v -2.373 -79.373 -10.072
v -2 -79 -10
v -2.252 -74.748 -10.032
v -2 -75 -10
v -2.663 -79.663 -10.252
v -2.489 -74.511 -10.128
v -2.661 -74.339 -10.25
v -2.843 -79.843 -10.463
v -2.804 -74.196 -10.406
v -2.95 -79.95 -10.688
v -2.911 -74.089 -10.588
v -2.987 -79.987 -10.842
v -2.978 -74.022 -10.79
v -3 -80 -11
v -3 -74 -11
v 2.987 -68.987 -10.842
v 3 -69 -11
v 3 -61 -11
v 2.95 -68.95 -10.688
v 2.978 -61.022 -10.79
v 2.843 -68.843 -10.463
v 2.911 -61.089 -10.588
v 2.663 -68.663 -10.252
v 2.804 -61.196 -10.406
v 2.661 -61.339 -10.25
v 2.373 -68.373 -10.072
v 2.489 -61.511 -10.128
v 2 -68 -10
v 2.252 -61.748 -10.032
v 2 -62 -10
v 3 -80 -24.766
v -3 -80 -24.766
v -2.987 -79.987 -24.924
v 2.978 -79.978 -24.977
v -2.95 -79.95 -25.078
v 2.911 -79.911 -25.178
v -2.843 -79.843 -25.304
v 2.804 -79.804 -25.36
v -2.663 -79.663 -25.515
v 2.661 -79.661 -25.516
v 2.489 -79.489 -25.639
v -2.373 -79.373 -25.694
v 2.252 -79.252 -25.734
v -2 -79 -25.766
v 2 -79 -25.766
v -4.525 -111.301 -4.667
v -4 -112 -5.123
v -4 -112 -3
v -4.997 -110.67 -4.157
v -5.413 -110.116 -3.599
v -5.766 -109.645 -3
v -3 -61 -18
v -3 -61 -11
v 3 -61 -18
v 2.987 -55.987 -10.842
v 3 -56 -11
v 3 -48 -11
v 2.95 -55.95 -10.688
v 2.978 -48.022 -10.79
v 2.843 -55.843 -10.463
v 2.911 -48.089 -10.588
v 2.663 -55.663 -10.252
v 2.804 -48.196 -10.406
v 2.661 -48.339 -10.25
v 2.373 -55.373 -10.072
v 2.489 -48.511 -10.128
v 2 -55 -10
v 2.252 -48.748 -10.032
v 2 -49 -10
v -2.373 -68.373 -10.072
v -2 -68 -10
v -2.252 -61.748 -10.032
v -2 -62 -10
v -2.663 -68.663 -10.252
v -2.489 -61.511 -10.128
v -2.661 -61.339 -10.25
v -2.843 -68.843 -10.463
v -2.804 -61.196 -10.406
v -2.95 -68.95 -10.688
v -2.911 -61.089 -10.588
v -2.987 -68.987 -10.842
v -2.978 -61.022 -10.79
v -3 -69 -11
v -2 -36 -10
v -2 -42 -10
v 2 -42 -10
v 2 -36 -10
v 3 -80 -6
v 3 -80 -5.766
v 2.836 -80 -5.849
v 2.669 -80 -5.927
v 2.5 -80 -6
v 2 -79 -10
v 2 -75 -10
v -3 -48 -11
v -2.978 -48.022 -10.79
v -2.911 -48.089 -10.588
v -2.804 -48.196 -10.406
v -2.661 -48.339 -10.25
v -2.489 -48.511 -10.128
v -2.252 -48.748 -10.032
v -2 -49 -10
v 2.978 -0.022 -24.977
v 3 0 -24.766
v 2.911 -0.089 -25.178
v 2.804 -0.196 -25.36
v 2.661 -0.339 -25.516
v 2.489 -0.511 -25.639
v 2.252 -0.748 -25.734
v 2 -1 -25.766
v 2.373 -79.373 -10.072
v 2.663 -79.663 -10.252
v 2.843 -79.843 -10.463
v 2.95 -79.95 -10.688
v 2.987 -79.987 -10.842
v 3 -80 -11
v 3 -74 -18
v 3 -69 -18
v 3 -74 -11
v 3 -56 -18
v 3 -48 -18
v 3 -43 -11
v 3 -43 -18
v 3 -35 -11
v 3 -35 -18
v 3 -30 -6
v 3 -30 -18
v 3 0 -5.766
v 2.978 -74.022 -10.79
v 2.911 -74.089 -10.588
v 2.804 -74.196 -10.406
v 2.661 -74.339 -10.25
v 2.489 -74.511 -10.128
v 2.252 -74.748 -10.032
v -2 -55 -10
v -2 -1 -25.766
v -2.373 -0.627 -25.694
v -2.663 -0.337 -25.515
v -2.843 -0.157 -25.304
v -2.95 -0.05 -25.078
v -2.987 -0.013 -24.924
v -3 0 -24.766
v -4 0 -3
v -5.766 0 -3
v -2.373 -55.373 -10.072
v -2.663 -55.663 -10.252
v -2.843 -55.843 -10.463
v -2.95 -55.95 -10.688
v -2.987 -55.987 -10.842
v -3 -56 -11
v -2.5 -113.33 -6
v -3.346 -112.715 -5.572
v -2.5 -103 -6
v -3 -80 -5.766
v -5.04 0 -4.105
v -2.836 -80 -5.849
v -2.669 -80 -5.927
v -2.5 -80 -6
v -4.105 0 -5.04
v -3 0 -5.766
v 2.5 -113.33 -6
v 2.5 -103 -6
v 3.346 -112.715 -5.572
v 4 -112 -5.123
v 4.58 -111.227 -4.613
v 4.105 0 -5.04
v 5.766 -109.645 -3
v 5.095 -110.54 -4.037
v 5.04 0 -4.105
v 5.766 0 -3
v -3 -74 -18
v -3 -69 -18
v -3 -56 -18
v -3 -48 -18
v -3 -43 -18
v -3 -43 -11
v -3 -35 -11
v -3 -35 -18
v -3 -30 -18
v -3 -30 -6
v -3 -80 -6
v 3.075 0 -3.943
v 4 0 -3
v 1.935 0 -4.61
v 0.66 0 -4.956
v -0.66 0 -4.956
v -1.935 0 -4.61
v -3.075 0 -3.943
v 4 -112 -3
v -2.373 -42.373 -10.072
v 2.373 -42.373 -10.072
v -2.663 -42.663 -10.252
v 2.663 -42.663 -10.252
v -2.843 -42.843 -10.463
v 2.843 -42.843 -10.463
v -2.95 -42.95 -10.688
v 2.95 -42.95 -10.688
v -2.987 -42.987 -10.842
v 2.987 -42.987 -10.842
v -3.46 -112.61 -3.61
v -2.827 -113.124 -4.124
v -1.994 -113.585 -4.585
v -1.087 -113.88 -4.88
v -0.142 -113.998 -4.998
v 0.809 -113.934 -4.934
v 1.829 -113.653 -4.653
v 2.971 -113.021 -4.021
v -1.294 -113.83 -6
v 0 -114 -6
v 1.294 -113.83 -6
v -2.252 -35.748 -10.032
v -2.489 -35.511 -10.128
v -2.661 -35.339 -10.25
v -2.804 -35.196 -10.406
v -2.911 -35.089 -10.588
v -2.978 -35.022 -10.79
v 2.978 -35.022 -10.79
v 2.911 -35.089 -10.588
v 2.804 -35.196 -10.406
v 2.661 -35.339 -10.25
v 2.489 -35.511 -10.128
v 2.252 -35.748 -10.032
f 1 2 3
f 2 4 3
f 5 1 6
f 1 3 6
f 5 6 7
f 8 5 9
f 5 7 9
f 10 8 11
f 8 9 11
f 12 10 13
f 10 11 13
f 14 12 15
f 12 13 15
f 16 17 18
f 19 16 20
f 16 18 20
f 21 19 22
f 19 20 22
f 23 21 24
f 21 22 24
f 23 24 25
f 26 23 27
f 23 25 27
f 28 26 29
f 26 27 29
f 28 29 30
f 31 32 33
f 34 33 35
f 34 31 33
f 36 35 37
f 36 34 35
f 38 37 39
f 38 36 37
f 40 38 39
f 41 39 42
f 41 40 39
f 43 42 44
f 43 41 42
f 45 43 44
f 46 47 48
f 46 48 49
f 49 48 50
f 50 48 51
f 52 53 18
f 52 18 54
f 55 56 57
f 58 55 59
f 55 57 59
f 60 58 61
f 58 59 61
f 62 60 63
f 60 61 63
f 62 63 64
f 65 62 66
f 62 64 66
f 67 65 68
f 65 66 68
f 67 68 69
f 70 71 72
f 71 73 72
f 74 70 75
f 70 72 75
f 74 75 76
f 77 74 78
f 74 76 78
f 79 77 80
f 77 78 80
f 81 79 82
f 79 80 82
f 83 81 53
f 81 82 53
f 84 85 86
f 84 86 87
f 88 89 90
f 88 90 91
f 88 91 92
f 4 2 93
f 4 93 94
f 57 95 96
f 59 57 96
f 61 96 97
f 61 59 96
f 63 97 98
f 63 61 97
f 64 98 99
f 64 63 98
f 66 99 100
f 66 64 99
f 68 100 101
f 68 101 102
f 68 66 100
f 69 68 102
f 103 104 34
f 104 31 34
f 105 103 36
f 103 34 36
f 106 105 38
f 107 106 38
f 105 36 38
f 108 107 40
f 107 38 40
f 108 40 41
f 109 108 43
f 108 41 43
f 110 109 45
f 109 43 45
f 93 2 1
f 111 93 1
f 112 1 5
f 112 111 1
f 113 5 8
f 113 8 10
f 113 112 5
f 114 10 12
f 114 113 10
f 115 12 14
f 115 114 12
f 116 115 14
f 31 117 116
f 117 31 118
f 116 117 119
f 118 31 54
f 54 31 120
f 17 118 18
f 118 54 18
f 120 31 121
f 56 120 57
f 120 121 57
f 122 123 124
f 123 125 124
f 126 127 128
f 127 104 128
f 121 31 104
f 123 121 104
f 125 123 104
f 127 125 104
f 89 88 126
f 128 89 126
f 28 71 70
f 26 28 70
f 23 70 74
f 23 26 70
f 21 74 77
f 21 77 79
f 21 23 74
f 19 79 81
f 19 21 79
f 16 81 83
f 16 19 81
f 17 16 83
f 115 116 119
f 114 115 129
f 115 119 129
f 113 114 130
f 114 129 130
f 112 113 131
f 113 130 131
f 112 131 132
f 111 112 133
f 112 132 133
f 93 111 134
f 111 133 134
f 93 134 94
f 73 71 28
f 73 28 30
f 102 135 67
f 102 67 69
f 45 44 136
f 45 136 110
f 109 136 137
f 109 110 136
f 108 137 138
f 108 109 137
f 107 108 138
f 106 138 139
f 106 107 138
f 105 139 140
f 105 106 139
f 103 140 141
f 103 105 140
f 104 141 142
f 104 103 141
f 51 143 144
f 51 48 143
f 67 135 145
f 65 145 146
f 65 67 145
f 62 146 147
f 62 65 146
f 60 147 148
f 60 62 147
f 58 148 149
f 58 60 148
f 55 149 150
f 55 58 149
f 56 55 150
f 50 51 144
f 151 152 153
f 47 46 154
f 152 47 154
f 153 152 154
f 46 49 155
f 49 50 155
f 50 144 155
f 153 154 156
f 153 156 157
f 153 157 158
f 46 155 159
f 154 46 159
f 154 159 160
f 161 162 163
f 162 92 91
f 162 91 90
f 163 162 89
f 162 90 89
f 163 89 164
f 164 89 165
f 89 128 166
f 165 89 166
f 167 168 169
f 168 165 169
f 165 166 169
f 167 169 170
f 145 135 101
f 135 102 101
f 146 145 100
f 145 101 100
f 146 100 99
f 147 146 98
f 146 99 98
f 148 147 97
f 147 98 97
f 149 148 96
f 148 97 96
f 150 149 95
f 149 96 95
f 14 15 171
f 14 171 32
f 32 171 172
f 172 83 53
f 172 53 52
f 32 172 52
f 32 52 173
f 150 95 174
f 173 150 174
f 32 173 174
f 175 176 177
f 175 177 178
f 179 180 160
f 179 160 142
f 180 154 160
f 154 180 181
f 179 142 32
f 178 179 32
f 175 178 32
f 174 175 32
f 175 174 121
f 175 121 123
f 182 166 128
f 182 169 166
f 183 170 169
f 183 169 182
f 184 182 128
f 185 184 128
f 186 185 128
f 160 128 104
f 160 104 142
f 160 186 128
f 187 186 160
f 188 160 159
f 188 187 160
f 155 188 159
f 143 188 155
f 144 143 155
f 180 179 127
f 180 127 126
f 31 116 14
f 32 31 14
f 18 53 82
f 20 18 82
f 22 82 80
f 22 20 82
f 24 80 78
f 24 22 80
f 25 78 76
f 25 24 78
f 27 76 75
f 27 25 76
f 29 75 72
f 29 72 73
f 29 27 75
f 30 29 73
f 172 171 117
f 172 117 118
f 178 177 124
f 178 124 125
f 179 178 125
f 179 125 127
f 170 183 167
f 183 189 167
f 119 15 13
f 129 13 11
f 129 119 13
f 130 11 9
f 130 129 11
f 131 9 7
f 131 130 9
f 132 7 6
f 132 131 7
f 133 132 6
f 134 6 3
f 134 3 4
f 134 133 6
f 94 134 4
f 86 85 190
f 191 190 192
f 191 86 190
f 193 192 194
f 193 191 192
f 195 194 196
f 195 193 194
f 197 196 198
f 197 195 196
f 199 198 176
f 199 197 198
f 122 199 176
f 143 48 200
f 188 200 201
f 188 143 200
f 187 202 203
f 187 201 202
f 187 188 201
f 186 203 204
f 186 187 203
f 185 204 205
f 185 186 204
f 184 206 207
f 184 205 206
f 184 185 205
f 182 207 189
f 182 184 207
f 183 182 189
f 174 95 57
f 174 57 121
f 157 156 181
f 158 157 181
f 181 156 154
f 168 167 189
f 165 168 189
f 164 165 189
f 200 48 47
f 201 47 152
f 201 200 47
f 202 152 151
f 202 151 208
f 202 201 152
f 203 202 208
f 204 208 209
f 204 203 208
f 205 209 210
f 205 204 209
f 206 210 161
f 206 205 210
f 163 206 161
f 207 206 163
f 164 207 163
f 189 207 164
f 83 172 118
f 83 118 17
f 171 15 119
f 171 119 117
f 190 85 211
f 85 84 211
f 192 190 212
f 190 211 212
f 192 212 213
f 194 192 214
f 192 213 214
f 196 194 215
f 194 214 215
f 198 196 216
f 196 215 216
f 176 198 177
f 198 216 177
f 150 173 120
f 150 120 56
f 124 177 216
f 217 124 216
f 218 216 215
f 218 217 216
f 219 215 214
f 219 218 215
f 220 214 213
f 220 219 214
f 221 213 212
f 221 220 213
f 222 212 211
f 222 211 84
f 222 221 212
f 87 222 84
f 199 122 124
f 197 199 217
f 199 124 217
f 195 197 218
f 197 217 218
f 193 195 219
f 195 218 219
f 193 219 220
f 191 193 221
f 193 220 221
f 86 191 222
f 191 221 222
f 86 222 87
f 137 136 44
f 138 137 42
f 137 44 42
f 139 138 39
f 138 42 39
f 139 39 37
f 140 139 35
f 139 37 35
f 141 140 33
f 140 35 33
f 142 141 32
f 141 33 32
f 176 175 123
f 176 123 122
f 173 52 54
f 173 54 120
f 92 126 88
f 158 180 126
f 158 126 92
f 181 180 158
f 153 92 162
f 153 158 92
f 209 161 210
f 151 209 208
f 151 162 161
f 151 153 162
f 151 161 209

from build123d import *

# Parameters (mm, degrees)
PAD_DEPTH            = 120
PAD001_DEPTH         = 80
POCKET_DEPTH         = 5.767281
POCKET_DEPTH_BACK    = 5.767281
POCKET001_DEPTH      = 25.767281
POCKET002_DEPTH      = 5.767281
POCKET002_DEPTH_BACK = 5.767281
POCKET003_DEPTH      = 5.767281
POCKET003_DEPTH_BACK = 5.767281
POCKET004_DEPTH      = 5.767281
POCKET004_DEPTH_BACK = 5.767281
FILLET_R             = 1


with BuildPart() as part:
    # Sketch → Pad (new body)
    with BuildSketch(Plane.XZ):
        with BuildLine():
            ThreePointArc((-4, -3), (0, -5), (4, -3))
            Line((4, -3), (5.766281, -3))
            ThreePointArc((-5.766281, -3), (0, -6.5), (5.766281, -3))
            Line((-4, -3), (-5.766281, -3))
        make_face()
    extrude(amount=PAD_DEPTH)

    # Sketch001 → Pad001 (join)
    with BuildSketch(Plane.XZ):
        with BuildLine():
            ThreePointArc((-3, -5.766281), (0, -6.5), (3, -5.766281))
            Line((3, -25.766281), (3, -5.766281))
            Line((-3, -25.766281), (3, -25.766281))
            Line((-3, -5.766281), (-3, -25.766281))
        make_face()
    extrude(amount=PAD001_DEPTH)

    # Sketch002 → Pocket (cut, two sides)
    with BuildSketch(Plane.YZ) as pocket_sk:
        Polygon((-30, -18), (-30, -6), (-90, -6), (-90, -10), (-35, -10), (-35, -18), align=None)
    extrude(amount=-POCKET_DEPTH, mode=Mode.SUBTRACT)
    extrude(pocket_sk.sketch, amount=POCKET_DEPTH_BACK, mode=Mode.SUBTRACT)

    # Sketch003 → Pocket001 (cut, through all)
    with BuildSketch(Plane.XY):
        with BuildLine():
            Line((-10, -104), (-10, -134))
            Line((-10, -134), (10, -134))
            Line((10, -134), (10, -104))
            Line((10, -104), (4, -112))
            ThreePointArc((-4, -112), (0, -114), (4, -112))
            Line((-4, -112), (-10, -104))
        make_face()
    extrude(amount=-POCKET001_DEPTH, mode=Mode.SUBTRACT)

    # Sketch004 → Pocket002 (cut, two sides)
    with BuildSketch(Plane.YZ) as pocket002_sk:
        Polygon((-43, -18), (-43, -6), (-103, -6), (-103, -10), (-48, -10), (-48, -18), align=None)
    extrude(amount=-POCKET002_DEPTH, mode=Mode.SUBTRACT)
    extrude(pocket002_sk.sketch, amount=POCKET002_DEPTH_BACK, mode=Mode.SUBTRACT)

    # Sketch005 → Pocket003 (cut, two sides)
    with BuildSketch(Plane.YZ) as pocket003_sk:
        Polygon((-56, -18), (-56, -6), (-116, -6), (-116, -10), (-61, -10), (-61, -18), align=None)
    extrude(amount=-POCKET003_DEPTH, mode=Mode.SUBTRACT)
    extrude(pocket003_sk.sketch, amount=POCKET003_DEPTH_BACK, mode=Mode.SUBTRACT)

    # Sketch006 → Pocket004 (cut, two sides)
    with BuildSketch(Plane.YZ) as pocket004_sk:
        Polygon((-69, -18), (-69, -6), (-129, -6), (-129, -10), (-74, -10), (-74, -18), align=None)
    extrude(amount=-POCKET004_DEPTH, mode=Mode.SUBTRACT)
    extrude(pocket004_sk.sketch, amount=POCKET004_DEPTH_BACK, mode=Mode.SUBTRACT)

    # Fillet
    fillet_edges = [part.edges().sort_by_distance(p)[0] for p in [
        (0, -74, -10),
        (-3, -77, -10),
        (0, -80, -10),
        (3, -77, -10),
        (0, -61, -10),
        (-3, -65, -10),
        (0, -69, -10),
        (3, -65, -10),
        (0, -48, -10),
        (-3, -52, -10),
        (0, -56, -10),
        (3, -52, -10),
        (0, -35, -10),
        (-3, -39, -10),
        (0, -43, -10),
        (3, -39, -10),
        (-3, -40, -25.766281),
        (3, -40, -25.766281),
        (0, 0, -25.766281),
        (0, -80, -25.766281),
    ]]
    fillet(fillet_edges, radius=FILLET_R)


solid = part.part
